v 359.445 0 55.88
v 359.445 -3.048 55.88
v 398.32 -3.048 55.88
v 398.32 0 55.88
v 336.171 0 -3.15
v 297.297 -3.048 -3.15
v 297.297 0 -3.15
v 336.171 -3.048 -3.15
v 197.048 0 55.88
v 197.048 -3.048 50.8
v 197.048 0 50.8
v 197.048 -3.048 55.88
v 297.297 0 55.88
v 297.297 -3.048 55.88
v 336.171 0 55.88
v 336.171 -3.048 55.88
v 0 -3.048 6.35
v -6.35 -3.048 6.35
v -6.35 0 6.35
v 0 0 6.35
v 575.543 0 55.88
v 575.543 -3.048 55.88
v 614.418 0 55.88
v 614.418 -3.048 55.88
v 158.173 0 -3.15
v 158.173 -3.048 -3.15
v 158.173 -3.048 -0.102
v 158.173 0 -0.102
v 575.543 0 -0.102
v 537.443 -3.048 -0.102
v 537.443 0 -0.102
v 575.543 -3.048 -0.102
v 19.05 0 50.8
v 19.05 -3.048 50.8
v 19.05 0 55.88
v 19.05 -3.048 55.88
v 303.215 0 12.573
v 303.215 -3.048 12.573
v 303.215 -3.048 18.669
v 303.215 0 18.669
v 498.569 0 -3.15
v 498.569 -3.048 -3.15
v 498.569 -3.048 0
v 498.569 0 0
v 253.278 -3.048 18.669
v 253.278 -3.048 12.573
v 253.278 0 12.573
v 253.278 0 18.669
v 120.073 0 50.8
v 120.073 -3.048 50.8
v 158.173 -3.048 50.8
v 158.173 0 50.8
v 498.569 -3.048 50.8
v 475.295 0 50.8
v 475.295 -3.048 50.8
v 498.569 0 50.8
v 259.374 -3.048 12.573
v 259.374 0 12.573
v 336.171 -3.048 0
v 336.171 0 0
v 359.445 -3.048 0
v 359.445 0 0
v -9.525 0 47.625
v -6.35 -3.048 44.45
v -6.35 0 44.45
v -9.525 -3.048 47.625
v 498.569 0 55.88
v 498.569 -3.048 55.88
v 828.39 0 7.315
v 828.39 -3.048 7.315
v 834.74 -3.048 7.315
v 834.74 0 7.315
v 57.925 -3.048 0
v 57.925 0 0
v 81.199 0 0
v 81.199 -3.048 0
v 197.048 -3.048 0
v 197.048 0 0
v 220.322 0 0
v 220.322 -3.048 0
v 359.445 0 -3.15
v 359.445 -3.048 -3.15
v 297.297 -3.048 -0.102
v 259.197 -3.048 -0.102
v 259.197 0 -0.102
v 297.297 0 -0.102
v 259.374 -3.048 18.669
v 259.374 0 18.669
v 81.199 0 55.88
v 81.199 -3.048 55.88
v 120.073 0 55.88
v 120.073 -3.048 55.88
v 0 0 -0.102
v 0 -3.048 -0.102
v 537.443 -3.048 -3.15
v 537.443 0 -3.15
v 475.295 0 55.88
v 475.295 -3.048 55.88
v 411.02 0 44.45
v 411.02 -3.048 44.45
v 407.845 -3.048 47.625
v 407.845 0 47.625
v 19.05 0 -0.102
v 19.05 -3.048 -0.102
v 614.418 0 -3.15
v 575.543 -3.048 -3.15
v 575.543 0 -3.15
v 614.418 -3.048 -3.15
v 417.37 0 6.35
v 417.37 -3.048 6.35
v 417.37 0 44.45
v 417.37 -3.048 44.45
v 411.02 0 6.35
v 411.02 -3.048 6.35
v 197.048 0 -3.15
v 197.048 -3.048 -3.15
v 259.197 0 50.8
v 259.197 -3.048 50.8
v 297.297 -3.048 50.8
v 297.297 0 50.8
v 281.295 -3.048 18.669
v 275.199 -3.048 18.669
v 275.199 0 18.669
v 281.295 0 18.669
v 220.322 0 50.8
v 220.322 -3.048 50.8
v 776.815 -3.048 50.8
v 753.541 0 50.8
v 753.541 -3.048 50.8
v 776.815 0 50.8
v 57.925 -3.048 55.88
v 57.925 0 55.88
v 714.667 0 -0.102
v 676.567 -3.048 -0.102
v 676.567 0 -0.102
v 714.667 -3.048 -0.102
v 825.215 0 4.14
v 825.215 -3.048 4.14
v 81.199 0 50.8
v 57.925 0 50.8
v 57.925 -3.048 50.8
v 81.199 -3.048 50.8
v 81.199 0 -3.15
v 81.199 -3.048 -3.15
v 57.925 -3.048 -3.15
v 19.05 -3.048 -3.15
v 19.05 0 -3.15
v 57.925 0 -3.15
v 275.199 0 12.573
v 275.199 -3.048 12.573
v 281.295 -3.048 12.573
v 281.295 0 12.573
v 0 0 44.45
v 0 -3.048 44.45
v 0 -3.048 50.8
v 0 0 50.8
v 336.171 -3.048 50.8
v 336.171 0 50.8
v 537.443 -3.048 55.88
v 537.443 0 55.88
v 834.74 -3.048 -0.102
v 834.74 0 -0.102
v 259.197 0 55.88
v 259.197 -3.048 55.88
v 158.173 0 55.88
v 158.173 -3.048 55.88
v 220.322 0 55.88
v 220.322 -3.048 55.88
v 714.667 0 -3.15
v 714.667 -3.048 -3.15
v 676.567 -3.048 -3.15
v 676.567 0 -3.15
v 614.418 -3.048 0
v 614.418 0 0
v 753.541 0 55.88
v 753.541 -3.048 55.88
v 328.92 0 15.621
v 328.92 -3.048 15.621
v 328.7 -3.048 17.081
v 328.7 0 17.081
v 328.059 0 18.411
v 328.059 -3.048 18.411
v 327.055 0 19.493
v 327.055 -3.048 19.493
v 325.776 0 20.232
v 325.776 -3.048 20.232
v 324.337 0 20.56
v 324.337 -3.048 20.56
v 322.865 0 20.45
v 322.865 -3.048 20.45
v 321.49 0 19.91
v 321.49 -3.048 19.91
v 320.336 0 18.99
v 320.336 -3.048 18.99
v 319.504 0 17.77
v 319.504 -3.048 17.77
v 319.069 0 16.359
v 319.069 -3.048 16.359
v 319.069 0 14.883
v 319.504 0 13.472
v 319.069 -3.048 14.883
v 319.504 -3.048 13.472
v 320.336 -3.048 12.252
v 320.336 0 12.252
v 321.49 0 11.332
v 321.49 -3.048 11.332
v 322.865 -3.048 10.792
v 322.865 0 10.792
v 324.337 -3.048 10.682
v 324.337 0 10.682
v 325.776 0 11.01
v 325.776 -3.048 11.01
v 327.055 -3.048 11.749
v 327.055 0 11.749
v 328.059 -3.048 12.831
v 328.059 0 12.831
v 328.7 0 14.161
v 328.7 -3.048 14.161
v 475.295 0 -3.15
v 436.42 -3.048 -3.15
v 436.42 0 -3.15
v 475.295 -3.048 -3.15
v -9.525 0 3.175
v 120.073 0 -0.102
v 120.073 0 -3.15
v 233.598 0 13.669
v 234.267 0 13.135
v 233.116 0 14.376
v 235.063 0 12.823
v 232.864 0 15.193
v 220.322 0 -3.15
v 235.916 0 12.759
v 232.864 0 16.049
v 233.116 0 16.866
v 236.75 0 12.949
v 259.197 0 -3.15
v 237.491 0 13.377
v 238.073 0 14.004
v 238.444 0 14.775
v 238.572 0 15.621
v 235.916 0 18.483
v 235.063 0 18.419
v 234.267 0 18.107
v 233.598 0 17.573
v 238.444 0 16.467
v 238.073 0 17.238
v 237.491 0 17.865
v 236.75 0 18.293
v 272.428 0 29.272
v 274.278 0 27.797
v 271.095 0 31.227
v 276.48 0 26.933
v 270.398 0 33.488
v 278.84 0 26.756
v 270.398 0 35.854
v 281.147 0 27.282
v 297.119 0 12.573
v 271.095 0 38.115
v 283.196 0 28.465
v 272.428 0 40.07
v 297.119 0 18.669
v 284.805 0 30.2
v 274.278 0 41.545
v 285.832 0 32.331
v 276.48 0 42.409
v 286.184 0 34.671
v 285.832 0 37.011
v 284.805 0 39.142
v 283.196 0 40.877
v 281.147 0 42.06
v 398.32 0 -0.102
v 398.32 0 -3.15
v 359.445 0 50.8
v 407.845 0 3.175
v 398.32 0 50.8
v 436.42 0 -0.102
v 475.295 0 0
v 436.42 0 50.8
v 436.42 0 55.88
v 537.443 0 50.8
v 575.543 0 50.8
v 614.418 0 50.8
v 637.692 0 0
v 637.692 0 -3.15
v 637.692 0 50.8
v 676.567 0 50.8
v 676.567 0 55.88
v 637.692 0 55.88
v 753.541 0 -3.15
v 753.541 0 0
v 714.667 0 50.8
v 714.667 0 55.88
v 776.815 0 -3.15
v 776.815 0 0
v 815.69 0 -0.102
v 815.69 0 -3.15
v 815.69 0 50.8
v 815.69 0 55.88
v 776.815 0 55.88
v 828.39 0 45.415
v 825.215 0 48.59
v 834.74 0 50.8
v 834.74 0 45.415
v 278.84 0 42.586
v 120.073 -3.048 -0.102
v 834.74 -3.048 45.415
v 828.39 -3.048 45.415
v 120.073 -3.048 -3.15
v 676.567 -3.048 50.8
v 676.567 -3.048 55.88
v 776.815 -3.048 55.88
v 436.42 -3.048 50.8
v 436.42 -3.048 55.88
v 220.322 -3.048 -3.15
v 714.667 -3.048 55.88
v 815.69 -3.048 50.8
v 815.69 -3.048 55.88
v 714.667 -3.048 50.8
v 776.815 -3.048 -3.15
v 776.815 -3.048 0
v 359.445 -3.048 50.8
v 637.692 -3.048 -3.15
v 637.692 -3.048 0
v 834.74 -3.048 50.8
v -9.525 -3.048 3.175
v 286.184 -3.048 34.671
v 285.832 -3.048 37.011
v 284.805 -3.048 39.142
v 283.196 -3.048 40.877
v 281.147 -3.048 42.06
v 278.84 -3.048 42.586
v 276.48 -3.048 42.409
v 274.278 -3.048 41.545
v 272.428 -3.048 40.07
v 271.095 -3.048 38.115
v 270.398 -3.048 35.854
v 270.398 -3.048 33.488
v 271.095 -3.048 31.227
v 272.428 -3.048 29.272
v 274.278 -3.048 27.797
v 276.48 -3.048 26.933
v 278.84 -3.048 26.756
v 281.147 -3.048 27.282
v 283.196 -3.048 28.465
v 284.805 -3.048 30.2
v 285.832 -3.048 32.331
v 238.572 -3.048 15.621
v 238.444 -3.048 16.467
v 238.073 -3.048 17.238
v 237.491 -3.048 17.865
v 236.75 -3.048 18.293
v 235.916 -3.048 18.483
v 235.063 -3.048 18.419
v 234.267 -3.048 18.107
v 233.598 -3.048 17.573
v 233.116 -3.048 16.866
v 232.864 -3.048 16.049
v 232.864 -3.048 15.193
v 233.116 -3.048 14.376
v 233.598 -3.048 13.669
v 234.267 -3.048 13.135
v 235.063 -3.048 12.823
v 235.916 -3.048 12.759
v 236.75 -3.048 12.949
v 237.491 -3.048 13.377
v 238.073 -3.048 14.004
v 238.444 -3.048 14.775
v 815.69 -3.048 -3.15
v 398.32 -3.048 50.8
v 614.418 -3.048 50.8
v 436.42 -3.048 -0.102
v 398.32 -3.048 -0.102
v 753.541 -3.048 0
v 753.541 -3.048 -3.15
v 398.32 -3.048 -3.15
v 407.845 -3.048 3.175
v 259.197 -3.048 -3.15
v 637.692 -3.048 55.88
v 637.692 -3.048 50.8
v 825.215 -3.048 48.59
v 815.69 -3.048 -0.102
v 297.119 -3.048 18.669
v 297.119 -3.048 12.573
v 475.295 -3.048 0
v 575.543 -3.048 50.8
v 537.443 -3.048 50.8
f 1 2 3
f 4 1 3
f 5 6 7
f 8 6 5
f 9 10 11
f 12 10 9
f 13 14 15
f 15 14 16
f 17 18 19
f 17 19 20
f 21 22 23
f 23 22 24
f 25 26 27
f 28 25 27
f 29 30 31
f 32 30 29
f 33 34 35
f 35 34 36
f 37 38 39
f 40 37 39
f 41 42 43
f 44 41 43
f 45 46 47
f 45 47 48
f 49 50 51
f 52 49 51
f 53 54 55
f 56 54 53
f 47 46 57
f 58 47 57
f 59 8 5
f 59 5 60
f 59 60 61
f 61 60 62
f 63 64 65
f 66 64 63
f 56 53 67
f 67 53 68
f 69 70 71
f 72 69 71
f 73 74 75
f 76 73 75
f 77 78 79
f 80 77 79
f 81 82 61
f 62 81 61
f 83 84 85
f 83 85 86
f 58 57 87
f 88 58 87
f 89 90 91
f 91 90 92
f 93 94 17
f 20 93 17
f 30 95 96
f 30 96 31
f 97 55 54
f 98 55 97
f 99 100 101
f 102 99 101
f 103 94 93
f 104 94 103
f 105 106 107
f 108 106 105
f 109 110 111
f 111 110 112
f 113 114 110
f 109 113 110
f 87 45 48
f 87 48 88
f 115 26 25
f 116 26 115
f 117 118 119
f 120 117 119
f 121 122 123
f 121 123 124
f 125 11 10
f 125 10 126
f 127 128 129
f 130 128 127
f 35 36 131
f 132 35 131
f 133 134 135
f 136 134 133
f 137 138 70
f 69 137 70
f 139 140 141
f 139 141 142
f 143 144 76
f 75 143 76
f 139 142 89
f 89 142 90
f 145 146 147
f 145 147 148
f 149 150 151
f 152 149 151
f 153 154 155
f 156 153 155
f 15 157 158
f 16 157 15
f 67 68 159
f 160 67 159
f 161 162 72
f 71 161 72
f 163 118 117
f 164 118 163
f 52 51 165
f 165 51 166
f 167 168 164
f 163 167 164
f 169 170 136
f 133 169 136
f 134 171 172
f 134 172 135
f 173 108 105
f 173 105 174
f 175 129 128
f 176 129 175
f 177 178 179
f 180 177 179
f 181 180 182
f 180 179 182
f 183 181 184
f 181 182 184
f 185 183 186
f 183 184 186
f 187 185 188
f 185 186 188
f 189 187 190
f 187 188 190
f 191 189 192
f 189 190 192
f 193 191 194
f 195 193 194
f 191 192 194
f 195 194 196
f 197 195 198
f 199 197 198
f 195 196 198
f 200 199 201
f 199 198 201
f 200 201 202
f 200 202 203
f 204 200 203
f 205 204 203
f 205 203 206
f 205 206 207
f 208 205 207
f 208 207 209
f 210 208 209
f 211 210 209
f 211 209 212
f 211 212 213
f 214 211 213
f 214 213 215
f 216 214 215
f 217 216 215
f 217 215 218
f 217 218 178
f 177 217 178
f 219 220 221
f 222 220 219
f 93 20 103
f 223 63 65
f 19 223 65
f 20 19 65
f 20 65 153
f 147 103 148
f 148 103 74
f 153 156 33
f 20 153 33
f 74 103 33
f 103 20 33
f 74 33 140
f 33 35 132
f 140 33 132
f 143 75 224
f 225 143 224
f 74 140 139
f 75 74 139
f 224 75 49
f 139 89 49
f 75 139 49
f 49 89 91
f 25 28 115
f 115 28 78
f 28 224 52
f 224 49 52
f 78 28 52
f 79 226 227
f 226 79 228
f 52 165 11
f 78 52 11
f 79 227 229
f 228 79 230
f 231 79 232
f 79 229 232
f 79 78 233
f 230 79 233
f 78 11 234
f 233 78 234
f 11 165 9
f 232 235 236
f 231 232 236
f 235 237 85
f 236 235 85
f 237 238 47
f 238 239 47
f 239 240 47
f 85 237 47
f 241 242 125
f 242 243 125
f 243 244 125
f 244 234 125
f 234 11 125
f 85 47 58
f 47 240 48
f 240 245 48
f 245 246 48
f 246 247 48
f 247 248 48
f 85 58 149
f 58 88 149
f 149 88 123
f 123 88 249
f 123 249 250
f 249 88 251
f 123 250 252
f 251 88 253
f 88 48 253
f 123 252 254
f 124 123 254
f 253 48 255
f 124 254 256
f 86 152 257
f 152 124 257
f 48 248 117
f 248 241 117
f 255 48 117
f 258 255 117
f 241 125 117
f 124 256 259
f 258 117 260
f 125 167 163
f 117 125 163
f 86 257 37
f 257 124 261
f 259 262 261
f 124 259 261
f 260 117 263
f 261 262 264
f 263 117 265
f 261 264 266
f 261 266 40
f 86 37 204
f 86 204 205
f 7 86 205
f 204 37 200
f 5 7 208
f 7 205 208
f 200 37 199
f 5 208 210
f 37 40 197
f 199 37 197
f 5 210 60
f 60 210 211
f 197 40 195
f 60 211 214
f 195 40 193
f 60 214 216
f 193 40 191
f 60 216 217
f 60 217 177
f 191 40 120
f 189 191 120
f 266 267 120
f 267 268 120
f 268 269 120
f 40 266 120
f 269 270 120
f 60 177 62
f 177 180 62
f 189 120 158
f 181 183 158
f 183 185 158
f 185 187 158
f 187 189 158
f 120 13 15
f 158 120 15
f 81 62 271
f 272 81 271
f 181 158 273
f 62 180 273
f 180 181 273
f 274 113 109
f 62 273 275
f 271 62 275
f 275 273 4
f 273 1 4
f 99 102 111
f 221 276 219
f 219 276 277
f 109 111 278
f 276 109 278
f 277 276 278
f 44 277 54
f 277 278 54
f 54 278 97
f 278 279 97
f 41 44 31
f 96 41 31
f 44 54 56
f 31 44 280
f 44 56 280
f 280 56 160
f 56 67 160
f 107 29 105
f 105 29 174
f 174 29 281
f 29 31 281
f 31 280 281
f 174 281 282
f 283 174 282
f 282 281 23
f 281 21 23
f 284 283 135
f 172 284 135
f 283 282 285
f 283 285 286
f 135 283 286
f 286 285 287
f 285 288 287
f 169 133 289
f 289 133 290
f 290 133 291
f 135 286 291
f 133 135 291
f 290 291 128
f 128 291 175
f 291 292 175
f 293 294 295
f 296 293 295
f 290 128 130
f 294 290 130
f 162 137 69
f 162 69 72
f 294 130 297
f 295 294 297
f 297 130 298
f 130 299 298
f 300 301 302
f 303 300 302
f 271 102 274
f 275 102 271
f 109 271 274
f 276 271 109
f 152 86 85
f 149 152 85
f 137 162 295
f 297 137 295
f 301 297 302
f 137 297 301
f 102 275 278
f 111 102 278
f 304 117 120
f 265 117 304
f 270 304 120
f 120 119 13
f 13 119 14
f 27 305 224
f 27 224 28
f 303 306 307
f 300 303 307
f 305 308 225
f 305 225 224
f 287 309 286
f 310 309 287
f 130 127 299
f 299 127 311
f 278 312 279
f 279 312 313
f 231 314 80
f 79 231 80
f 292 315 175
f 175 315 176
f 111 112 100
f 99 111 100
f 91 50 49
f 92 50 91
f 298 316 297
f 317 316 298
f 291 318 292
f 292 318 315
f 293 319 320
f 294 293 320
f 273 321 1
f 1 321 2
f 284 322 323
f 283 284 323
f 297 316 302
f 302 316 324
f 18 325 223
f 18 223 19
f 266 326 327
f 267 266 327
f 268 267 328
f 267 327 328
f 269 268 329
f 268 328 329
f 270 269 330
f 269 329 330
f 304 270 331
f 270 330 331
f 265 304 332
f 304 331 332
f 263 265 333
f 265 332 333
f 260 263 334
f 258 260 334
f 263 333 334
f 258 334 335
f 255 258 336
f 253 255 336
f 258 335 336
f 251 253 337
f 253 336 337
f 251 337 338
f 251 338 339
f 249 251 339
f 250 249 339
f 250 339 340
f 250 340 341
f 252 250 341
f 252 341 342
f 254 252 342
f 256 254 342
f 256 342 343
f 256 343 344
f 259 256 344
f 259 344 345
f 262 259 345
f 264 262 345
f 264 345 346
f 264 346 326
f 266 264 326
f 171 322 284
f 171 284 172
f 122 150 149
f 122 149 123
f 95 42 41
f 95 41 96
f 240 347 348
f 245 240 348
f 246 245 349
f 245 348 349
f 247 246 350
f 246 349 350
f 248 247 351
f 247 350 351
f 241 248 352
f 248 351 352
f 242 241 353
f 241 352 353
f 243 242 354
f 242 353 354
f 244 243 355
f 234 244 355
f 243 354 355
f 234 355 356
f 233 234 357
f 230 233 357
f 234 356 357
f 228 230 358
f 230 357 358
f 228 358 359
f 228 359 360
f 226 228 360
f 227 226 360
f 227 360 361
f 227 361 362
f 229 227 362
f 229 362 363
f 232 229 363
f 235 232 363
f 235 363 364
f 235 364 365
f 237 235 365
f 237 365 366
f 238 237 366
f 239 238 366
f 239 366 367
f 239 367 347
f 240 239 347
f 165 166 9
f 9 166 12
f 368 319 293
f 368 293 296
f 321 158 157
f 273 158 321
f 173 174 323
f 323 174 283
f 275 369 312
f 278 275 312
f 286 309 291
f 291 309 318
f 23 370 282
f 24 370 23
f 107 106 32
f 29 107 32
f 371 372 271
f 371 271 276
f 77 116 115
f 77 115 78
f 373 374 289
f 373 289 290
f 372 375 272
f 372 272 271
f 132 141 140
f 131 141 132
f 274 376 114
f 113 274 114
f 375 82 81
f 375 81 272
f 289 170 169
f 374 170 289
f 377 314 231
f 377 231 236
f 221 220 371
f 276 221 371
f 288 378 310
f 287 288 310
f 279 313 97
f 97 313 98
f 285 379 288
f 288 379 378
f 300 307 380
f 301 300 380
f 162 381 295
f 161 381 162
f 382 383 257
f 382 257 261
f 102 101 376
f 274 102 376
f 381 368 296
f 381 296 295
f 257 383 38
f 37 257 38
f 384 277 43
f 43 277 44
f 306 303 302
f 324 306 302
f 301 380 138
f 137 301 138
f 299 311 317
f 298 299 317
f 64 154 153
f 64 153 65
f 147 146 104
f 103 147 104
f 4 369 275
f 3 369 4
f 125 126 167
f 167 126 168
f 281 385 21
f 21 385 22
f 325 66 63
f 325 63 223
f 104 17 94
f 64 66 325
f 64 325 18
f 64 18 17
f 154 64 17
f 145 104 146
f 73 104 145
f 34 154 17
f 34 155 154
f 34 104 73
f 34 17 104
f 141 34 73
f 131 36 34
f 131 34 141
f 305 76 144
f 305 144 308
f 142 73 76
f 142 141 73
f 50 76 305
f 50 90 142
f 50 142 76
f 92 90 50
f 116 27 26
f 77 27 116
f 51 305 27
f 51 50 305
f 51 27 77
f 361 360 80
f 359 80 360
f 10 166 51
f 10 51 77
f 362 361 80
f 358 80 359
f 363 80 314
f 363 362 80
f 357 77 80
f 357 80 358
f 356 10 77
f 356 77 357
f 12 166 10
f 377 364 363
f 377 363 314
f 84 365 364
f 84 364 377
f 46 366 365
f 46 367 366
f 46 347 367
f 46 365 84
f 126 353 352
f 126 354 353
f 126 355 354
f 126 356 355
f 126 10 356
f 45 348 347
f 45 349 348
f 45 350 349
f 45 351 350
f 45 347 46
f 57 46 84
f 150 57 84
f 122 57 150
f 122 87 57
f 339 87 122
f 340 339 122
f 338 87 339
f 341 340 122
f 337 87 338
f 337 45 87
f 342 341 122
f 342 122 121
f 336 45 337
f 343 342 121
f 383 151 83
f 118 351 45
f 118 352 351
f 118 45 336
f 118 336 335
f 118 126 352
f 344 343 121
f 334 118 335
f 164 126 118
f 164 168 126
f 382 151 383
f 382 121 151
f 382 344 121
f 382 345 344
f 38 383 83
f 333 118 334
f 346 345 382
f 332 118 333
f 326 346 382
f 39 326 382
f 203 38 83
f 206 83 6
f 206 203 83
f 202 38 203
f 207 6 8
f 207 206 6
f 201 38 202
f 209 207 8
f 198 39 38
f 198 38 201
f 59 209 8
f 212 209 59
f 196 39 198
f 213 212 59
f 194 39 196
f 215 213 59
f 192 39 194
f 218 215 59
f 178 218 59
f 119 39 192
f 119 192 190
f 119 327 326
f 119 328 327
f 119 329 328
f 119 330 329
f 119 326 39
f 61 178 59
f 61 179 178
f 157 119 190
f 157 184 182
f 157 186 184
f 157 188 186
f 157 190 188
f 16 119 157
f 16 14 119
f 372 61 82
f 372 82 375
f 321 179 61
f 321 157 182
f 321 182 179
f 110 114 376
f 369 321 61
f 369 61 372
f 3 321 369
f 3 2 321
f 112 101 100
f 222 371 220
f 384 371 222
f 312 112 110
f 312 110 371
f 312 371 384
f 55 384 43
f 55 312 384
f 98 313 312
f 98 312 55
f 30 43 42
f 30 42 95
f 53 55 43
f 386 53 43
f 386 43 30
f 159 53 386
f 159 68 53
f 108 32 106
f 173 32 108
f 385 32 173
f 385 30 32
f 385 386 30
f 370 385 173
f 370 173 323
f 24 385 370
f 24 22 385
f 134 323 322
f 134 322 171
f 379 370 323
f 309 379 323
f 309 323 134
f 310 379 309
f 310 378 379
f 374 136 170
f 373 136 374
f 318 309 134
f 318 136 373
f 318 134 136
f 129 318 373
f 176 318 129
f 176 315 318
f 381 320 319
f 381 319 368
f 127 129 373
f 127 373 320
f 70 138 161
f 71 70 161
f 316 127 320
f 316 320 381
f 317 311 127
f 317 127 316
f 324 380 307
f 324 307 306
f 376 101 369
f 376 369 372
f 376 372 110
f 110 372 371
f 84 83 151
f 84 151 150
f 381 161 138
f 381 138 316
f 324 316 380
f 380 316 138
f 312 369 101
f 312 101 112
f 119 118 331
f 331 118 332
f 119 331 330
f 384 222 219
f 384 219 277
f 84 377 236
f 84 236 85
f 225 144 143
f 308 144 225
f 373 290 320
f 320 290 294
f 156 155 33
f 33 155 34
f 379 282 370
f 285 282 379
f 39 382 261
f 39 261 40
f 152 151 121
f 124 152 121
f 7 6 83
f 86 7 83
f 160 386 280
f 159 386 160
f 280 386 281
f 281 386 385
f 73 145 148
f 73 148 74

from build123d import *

# Parameters (mm, degrees)
F0_W      = 834.7400754492
F0_H      = 50.8
F1_DEPTH  = 3.048
F3_W      = 57.9247
F3_H      = 5.08
F3_W_2    = 115.8494
F3_H_2    = 3.1496
F4_DEPTH  = 3.048
F6_DEPTH  = 3.048
F7_DEPTH  = 3.049
F9_W      = 6.096
F9_H      = 6.096
F9_R      = 2.8702
F9_R_2    = 4.953
F9_R_3    = 7.9375
F10_DEPTH = 3.049
F11_DEPTH = 25.4
F12_W     = 38.1
F12_H     = 3.048
F12_H_2   = 5.08
F13_DEPTH = 3.048


# Not quite as in the source:
# - a feature names something its author has since deleted; it is built from what else it names


with BuildPart() as f1:
    # F0 (on Front) → F1 (new body)
    with BuildSketch(Plane.XZ):
        with Locations((417.3700377246, 25.4)):
            Rectangle(F0_W, F0_H)
    extrude(amount=F1_DEPTH)

    # F3 (on face) → F4 (join)
    with BuildSketch(Plane.XZ.offset(3.048)):
        with Locations((28.96235, 53.34)):
            Rectangle(F3_W, F3_H)
        with Locations((139.1233459082, 53.34)):
            Rectangle(F3_W_2, F3_H)
        with Locations((278.2466918164, 53.34)):
            Rectangle(F3_W_2, F3_H)
        with Locations((417.3700377246, 53.34)):
            Rectangle(F3_W_2, F3_H)
        with Locations((556.4933836328, 53.34)):
            Rectangle(F3_W_2, F3_H)
        with Locations((695.616729541, 53.34)):
            Rectangle(F3_W_2, F3_H)
        with Locations((805.7777254492, 53.34)):
            Rectangle(F3_W, F3_H)
        with Locations((28.96235, -1.5748)):
            Rectangle(F3_W, F3_H_2)
        with Locations((139.1233459082, -1.5748)):
            Rectangle(F3_W_2, F3_H_2)
        with Locations((278.2466918164, -1.5748)):
            Rectangle(F3_W_2, F3_H_2)
        with Locations((417.3700377246, -1.5748)):
            Rectangle(F3_W_2, F3_H_2)
        with Locations((556.4933836328, -1.5748)):
            Rectangle(F3_W_2, F3_H_2)
        with Locations((695.616729541, -1.5748)):
            Rectangle(F3_W_2, F3_H_2)
        with Locations((805.7777254492, -1.5748)):
            Rectangle(F3_W, F3_H_2)
    extrude(amount=-F4_DEPTH)

    # F5 (on face) → F6 (join)
    with BuildSketch(Plane.XZ.offset(3.048)):
        Polygon((-6.35, 6.35), (0, 6.35), (0, 44.45), (-6.35, 44.45), (-9.525, 47.625), (-9.525, 3.175), align=None)
    extrude(amount=-F6_DEPTH)

    # F5 (on face) → F7 (cut, through all)
    with BuildSketch(Plane.XZ.offset(3.048)):
        Polygon((828.3900754492, 7.3152), (834.7400754492, 7.3152), (834.7400754492, 45.4152), (828.3900754492, 45.4152), (825.2150754492, 48.5902), (825.2150754492, 4.1402), align=None)
    extrude(amount=-F7_DEPTH, mode=Mode.SUBTRACT)

    # F9 (on face) → F10 (cut, through all)
    with BuildSketch(Plane.XZ.offset(3.048)):
        with Locations((256.3264918164, 15.621)):
            Rectangle(F9_W, F9_H)
        with Locations((278.2466918164, 15.621)):
            Rectangle(F9_W, F9_H)
        with Locations((300.1668918164, 15.621)):
            Rectangle(F9_W, F9_H)
        with Locations((235.7016918164, 15.621)):
            Circle(F9_R)
        with Locations((323.9666918164, 15.621)):
            Circle(F9_R_2)
        with Locations((278.2466918164, 34.671)):
            Circle(F9_R_3)
    extrude(amount=-F10_DEPTH, mode=Mode.SUBTRACT)

    # F8 (on face) → F11 (cut)
    with BuildSketch(Plane.XZ.offset(3.048)):
        Polygon((411.0200377246, 6.35), (417.3700377246, 6.35), (417.3700377246, 44.45), (411.0200377246, 44.45), (407.8450377246, 47.625), (407.8450377246, 3.175), align=None)
    extrude(amount=-F11_DEPTH, mode=Mode.SUBTRACT)

    # F12 (on face) → F13 (cut, through all)
    with BuildSketch(Plane.XZ.offset(3.048)):
        with Locations((139.1233459082, -1.6256)):
            Rectangle(F12_W, F12_H)
        with Locations((278.2466918164, -1.6256)):
            Rectangle(F12_W, F12_H)
        with Locations((417.3700377246, -1.6256)):
            Rectangle(F12_W, F12_H)
        with Locations((556.4933836328, -1.6256)):
            Rectangle(F12_W, F12_H)
        with Locations((695.616729541, -1.6256)):
            Rectangle(F12_W, F12_H)
        with Locations((834.7400754492, -1.6256)):
            Rectangle(F12_W, F12_H)
        with Locations((0, -1.6256)):
            Rectangle(F12_W, F12_H)
        with Locations((0, 53.34)):
            Rectangle(F12_W, F12_H_2)
        with Locations((139.1233459082, 53.34)):
            Rectangle(F12_W, F12_H_2)
        with Locations((278.2466918164, 53.34)):
            Rectangle(F12_W, F12_H_2)
        with Locations((417.3700377246, 53.34)):
            Rectangle(F12_W, F12_H_2)
        with Locations((556.4933836328, 53.34)):
            Rectangle(F12_W, F12_H_2)
        with Locations((695.616729541, 53.34)):
            Rectangle(F12_W, F12_H_2)
        with Locations((834.7400754492, 53.34)):
            Rectangle(F12_W, F12_H_2)
    extrude(amount=-F13_DEPTH, mode=Mode.SUBTRACT)


solid = f1.part
